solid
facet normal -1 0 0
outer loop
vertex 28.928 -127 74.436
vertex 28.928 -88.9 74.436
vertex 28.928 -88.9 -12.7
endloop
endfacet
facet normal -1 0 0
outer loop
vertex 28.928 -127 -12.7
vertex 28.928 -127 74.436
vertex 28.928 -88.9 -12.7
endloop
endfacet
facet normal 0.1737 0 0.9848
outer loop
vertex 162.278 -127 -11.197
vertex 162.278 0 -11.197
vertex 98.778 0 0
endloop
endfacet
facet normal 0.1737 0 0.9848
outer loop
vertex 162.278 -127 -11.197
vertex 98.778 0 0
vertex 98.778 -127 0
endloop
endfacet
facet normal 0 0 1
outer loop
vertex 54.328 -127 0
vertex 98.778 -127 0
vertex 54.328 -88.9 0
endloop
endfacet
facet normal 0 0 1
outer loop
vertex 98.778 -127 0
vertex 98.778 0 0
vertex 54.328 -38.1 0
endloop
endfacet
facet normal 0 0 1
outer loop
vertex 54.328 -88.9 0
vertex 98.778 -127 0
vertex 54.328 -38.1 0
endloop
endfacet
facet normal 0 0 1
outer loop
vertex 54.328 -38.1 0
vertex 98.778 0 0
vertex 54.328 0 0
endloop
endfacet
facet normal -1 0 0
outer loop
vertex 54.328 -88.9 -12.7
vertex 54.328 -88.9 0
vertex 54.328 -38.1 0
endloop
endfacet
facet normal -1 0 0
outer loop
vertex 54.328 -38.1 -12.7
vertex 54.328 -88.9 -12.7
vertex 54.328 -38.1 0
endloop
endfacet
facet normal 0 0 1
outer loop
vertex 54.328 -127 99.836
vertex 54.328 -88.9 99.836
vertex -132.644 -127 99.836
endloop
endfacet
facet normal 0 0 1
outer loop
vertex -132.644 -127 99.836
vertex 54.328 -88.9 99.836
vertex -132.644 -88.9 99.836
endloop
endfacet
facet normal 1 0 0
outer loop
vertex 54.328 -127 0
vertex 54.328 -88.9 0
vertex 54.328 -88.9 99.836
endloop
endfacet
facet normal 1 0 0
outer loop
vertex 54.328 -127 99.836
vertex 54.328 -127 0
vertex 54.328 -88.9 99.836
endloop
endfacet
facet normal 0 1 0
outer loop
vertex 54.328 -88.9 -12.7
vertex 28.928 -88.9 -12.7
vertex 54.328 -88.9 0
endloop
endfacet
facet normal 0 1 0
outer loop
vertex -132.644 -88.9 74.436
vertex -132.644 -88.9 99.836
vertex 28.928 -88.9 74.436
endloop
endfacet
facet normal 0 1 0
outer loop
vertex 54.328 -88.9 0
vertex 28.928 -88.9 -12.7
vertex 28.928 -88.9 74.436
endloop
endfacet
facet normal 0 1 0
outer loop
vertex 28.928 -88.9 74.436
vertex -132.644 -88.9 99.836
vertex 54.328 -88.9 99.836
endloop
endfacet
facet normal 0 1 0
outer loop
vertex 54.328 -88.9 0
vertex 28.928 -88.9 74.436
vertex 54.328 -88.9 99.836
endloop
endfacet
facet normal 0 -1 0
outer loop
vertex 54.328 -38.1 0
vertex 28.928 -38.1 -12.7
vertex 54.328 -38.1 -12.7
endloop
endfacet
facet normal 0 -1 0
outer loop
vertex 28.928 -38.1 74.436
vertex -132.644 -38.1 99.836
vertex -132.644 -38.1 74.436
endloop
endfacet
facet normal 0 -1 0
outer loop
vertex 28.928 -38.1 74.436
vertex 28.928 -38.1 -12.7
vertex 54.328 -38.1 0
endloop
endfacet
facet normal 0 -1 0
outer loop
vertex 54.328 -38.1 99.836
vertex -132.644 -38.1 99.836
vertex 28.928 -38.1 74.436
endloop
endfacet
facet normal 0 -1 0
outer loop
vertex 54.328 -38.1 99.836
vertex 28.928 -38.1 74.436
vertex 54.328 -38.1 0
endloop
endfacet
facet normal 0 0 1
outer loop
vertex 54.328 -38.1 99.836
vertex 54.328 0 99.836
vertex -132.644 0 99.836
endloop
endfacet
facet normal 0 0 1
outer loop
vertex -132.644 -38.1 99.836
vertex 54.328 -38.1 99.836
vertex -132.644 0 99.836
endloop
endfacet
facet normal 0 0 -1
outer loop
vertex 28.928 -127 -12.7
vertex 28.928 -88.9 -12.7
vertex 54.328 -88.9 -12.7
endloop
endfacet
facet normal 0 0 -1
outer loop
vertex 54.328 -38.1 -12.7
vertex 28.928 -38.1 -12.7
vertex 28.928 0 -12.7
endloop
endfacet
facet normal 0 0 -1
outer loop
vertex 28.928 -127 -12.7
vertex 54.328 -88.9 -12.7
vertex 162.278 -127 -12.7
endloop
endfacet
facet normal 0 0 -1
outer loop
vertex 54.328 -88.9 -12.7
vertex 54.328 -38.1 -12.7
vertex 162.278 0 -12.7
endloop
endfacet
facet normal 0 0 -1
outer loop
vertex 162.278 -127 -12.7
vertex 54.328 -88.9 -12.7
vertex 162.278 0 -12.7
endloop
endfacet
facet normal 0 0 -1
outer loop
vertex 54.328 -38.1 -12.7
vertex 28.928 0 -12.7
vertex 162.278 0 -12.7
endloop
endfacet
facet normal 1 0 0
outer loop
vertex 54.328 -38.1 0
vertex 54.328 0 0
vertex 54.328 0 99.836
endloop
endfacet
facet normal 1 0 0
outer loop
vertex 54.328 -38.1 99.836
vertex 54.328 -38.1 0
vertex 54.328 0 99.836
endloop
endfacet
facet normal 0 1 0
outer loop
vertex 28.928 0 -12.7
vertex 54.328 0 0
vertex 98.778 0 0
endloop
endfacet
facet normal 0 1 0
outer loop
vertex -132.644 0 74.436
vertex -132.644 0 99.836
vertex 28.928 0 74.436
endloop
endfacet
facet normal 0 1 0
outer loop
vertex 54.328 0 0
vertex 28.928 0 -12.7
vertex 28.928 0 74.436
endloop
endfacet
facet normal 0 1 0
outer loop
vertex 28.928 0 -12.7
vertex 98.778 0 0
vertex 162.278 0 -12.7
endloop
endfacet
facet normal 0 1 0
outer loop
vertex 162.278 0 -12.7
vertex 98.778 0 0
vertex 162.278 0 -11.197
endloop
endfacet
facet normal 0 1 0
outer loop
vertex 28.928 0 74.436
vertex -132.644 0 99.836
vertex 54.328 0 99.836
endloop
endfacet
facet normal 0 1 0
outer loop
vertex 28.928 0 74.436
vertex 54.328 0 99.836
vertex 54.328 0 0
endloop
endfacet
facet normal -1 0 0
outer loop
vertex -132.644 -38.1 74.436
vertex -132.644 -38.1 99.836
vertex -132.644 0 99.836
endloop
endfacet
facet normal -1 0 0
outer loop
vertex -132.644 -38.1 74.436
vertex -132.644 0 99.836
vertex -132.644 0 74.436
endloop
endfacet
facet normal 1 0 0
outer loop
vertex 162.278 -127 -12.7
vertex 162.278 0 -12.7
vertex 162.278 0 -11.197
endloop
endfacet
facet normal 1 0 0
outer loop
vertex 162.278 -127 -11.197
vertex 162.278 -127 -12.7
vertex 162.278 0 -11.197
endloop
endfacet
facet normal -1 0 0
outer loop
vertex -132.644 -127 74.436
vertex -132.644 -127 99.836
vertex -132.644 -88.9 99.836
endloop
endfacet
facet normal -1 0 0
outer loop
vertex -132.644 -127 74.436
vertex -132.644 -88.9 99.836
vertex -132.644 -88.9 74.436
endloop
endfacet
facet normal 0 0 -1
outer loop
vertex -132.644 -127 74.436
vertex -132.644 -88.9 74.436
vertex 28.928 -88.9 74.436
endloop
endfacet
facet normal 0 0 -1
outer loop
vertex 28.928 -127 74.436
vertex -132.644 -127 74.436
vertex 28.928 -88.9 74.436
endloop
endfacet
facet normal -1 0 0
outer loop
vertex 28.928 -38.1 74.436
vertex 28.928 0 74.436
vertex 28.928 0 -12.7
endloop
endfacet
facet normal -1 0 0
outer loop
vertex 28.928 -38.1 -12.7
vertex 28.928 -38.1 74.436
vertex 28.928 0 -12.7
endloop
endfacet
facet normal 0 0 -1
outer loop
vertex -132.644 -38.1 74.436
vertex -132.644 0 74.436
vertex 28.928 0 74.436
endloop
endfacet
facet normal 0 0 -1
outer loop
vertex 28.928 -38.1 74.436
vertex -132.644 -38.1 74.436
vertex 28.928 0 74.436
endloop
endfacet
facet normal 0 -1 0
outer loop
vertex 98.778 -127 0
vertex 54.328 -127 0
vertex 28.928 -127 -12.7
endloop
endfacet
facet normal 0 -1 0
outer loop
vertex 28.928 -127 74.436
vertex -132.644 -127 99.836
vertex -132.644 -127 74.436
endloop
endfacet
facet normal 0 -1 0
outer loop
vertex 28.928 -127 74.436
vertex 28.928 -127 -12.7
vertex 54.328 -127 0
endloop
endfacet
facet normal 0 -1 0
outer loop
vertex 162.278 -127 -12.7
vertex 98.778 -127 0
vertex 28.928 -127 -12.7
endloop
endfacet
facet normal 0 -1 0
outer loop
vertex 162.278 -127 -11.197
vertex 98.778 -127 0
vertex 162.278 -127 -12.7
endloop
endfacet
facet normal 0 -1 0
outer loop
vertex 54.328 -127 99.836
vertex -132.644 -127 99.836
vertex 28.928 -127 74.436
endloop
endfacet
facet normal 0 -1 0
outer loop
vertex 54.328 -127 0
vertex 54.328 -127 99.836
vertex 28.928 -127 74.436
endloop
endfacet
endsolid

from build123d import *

# Parameters (mm, degrees)
F1_DEPTH = 127
F2_W     = 186.9721719681
F2_H     = 50.8
F3_DEPTH = 112.5370903122
F4_SIZE2 = 11.196763275
F4_SIZE  = 63.5


with BuildPart() as f1:
    # F0 (on Front) → F1 (new body)
    with BuildSketch(Plane.XZ):
        Polygon((162.2777349776, -12.7), (162.2777349776, 0), (54.3277631103, 0), (54.3277631103, 99.8360903122), (-132.6444088578, 99.8360903122), (-132.6444088578, 74.4360903122), (28.9277631103, 74.4360903122), (28.9277631103, -12.7), align=None)
    extrude(amount=F1_DEPTH)

    # F2 (on face) → F3 (cut, through all)
    with BuildSketch(Plane.XY.offset(99.8360903122)):
        with Locations((-39.1583228738, -63.5)):
            Rectangle(F2_W, F2_H)
    extrude(amount=-F3_DEPTH, mode=Mode.SUBTRACT)

    # F4
    f4_edges = [f1.edges().sort_by_distance(p)[0] for p in [
        (162.277735, -63.5, 0),
    ]]
    f4_side = f1.faces().sort_by_distance((108.302749, -63.5, 0))[0]
    chamfer(f4_edges, length=F4_SIZE, length2=F4_SIZE2, reference=f4_side)


solid = f1.part
